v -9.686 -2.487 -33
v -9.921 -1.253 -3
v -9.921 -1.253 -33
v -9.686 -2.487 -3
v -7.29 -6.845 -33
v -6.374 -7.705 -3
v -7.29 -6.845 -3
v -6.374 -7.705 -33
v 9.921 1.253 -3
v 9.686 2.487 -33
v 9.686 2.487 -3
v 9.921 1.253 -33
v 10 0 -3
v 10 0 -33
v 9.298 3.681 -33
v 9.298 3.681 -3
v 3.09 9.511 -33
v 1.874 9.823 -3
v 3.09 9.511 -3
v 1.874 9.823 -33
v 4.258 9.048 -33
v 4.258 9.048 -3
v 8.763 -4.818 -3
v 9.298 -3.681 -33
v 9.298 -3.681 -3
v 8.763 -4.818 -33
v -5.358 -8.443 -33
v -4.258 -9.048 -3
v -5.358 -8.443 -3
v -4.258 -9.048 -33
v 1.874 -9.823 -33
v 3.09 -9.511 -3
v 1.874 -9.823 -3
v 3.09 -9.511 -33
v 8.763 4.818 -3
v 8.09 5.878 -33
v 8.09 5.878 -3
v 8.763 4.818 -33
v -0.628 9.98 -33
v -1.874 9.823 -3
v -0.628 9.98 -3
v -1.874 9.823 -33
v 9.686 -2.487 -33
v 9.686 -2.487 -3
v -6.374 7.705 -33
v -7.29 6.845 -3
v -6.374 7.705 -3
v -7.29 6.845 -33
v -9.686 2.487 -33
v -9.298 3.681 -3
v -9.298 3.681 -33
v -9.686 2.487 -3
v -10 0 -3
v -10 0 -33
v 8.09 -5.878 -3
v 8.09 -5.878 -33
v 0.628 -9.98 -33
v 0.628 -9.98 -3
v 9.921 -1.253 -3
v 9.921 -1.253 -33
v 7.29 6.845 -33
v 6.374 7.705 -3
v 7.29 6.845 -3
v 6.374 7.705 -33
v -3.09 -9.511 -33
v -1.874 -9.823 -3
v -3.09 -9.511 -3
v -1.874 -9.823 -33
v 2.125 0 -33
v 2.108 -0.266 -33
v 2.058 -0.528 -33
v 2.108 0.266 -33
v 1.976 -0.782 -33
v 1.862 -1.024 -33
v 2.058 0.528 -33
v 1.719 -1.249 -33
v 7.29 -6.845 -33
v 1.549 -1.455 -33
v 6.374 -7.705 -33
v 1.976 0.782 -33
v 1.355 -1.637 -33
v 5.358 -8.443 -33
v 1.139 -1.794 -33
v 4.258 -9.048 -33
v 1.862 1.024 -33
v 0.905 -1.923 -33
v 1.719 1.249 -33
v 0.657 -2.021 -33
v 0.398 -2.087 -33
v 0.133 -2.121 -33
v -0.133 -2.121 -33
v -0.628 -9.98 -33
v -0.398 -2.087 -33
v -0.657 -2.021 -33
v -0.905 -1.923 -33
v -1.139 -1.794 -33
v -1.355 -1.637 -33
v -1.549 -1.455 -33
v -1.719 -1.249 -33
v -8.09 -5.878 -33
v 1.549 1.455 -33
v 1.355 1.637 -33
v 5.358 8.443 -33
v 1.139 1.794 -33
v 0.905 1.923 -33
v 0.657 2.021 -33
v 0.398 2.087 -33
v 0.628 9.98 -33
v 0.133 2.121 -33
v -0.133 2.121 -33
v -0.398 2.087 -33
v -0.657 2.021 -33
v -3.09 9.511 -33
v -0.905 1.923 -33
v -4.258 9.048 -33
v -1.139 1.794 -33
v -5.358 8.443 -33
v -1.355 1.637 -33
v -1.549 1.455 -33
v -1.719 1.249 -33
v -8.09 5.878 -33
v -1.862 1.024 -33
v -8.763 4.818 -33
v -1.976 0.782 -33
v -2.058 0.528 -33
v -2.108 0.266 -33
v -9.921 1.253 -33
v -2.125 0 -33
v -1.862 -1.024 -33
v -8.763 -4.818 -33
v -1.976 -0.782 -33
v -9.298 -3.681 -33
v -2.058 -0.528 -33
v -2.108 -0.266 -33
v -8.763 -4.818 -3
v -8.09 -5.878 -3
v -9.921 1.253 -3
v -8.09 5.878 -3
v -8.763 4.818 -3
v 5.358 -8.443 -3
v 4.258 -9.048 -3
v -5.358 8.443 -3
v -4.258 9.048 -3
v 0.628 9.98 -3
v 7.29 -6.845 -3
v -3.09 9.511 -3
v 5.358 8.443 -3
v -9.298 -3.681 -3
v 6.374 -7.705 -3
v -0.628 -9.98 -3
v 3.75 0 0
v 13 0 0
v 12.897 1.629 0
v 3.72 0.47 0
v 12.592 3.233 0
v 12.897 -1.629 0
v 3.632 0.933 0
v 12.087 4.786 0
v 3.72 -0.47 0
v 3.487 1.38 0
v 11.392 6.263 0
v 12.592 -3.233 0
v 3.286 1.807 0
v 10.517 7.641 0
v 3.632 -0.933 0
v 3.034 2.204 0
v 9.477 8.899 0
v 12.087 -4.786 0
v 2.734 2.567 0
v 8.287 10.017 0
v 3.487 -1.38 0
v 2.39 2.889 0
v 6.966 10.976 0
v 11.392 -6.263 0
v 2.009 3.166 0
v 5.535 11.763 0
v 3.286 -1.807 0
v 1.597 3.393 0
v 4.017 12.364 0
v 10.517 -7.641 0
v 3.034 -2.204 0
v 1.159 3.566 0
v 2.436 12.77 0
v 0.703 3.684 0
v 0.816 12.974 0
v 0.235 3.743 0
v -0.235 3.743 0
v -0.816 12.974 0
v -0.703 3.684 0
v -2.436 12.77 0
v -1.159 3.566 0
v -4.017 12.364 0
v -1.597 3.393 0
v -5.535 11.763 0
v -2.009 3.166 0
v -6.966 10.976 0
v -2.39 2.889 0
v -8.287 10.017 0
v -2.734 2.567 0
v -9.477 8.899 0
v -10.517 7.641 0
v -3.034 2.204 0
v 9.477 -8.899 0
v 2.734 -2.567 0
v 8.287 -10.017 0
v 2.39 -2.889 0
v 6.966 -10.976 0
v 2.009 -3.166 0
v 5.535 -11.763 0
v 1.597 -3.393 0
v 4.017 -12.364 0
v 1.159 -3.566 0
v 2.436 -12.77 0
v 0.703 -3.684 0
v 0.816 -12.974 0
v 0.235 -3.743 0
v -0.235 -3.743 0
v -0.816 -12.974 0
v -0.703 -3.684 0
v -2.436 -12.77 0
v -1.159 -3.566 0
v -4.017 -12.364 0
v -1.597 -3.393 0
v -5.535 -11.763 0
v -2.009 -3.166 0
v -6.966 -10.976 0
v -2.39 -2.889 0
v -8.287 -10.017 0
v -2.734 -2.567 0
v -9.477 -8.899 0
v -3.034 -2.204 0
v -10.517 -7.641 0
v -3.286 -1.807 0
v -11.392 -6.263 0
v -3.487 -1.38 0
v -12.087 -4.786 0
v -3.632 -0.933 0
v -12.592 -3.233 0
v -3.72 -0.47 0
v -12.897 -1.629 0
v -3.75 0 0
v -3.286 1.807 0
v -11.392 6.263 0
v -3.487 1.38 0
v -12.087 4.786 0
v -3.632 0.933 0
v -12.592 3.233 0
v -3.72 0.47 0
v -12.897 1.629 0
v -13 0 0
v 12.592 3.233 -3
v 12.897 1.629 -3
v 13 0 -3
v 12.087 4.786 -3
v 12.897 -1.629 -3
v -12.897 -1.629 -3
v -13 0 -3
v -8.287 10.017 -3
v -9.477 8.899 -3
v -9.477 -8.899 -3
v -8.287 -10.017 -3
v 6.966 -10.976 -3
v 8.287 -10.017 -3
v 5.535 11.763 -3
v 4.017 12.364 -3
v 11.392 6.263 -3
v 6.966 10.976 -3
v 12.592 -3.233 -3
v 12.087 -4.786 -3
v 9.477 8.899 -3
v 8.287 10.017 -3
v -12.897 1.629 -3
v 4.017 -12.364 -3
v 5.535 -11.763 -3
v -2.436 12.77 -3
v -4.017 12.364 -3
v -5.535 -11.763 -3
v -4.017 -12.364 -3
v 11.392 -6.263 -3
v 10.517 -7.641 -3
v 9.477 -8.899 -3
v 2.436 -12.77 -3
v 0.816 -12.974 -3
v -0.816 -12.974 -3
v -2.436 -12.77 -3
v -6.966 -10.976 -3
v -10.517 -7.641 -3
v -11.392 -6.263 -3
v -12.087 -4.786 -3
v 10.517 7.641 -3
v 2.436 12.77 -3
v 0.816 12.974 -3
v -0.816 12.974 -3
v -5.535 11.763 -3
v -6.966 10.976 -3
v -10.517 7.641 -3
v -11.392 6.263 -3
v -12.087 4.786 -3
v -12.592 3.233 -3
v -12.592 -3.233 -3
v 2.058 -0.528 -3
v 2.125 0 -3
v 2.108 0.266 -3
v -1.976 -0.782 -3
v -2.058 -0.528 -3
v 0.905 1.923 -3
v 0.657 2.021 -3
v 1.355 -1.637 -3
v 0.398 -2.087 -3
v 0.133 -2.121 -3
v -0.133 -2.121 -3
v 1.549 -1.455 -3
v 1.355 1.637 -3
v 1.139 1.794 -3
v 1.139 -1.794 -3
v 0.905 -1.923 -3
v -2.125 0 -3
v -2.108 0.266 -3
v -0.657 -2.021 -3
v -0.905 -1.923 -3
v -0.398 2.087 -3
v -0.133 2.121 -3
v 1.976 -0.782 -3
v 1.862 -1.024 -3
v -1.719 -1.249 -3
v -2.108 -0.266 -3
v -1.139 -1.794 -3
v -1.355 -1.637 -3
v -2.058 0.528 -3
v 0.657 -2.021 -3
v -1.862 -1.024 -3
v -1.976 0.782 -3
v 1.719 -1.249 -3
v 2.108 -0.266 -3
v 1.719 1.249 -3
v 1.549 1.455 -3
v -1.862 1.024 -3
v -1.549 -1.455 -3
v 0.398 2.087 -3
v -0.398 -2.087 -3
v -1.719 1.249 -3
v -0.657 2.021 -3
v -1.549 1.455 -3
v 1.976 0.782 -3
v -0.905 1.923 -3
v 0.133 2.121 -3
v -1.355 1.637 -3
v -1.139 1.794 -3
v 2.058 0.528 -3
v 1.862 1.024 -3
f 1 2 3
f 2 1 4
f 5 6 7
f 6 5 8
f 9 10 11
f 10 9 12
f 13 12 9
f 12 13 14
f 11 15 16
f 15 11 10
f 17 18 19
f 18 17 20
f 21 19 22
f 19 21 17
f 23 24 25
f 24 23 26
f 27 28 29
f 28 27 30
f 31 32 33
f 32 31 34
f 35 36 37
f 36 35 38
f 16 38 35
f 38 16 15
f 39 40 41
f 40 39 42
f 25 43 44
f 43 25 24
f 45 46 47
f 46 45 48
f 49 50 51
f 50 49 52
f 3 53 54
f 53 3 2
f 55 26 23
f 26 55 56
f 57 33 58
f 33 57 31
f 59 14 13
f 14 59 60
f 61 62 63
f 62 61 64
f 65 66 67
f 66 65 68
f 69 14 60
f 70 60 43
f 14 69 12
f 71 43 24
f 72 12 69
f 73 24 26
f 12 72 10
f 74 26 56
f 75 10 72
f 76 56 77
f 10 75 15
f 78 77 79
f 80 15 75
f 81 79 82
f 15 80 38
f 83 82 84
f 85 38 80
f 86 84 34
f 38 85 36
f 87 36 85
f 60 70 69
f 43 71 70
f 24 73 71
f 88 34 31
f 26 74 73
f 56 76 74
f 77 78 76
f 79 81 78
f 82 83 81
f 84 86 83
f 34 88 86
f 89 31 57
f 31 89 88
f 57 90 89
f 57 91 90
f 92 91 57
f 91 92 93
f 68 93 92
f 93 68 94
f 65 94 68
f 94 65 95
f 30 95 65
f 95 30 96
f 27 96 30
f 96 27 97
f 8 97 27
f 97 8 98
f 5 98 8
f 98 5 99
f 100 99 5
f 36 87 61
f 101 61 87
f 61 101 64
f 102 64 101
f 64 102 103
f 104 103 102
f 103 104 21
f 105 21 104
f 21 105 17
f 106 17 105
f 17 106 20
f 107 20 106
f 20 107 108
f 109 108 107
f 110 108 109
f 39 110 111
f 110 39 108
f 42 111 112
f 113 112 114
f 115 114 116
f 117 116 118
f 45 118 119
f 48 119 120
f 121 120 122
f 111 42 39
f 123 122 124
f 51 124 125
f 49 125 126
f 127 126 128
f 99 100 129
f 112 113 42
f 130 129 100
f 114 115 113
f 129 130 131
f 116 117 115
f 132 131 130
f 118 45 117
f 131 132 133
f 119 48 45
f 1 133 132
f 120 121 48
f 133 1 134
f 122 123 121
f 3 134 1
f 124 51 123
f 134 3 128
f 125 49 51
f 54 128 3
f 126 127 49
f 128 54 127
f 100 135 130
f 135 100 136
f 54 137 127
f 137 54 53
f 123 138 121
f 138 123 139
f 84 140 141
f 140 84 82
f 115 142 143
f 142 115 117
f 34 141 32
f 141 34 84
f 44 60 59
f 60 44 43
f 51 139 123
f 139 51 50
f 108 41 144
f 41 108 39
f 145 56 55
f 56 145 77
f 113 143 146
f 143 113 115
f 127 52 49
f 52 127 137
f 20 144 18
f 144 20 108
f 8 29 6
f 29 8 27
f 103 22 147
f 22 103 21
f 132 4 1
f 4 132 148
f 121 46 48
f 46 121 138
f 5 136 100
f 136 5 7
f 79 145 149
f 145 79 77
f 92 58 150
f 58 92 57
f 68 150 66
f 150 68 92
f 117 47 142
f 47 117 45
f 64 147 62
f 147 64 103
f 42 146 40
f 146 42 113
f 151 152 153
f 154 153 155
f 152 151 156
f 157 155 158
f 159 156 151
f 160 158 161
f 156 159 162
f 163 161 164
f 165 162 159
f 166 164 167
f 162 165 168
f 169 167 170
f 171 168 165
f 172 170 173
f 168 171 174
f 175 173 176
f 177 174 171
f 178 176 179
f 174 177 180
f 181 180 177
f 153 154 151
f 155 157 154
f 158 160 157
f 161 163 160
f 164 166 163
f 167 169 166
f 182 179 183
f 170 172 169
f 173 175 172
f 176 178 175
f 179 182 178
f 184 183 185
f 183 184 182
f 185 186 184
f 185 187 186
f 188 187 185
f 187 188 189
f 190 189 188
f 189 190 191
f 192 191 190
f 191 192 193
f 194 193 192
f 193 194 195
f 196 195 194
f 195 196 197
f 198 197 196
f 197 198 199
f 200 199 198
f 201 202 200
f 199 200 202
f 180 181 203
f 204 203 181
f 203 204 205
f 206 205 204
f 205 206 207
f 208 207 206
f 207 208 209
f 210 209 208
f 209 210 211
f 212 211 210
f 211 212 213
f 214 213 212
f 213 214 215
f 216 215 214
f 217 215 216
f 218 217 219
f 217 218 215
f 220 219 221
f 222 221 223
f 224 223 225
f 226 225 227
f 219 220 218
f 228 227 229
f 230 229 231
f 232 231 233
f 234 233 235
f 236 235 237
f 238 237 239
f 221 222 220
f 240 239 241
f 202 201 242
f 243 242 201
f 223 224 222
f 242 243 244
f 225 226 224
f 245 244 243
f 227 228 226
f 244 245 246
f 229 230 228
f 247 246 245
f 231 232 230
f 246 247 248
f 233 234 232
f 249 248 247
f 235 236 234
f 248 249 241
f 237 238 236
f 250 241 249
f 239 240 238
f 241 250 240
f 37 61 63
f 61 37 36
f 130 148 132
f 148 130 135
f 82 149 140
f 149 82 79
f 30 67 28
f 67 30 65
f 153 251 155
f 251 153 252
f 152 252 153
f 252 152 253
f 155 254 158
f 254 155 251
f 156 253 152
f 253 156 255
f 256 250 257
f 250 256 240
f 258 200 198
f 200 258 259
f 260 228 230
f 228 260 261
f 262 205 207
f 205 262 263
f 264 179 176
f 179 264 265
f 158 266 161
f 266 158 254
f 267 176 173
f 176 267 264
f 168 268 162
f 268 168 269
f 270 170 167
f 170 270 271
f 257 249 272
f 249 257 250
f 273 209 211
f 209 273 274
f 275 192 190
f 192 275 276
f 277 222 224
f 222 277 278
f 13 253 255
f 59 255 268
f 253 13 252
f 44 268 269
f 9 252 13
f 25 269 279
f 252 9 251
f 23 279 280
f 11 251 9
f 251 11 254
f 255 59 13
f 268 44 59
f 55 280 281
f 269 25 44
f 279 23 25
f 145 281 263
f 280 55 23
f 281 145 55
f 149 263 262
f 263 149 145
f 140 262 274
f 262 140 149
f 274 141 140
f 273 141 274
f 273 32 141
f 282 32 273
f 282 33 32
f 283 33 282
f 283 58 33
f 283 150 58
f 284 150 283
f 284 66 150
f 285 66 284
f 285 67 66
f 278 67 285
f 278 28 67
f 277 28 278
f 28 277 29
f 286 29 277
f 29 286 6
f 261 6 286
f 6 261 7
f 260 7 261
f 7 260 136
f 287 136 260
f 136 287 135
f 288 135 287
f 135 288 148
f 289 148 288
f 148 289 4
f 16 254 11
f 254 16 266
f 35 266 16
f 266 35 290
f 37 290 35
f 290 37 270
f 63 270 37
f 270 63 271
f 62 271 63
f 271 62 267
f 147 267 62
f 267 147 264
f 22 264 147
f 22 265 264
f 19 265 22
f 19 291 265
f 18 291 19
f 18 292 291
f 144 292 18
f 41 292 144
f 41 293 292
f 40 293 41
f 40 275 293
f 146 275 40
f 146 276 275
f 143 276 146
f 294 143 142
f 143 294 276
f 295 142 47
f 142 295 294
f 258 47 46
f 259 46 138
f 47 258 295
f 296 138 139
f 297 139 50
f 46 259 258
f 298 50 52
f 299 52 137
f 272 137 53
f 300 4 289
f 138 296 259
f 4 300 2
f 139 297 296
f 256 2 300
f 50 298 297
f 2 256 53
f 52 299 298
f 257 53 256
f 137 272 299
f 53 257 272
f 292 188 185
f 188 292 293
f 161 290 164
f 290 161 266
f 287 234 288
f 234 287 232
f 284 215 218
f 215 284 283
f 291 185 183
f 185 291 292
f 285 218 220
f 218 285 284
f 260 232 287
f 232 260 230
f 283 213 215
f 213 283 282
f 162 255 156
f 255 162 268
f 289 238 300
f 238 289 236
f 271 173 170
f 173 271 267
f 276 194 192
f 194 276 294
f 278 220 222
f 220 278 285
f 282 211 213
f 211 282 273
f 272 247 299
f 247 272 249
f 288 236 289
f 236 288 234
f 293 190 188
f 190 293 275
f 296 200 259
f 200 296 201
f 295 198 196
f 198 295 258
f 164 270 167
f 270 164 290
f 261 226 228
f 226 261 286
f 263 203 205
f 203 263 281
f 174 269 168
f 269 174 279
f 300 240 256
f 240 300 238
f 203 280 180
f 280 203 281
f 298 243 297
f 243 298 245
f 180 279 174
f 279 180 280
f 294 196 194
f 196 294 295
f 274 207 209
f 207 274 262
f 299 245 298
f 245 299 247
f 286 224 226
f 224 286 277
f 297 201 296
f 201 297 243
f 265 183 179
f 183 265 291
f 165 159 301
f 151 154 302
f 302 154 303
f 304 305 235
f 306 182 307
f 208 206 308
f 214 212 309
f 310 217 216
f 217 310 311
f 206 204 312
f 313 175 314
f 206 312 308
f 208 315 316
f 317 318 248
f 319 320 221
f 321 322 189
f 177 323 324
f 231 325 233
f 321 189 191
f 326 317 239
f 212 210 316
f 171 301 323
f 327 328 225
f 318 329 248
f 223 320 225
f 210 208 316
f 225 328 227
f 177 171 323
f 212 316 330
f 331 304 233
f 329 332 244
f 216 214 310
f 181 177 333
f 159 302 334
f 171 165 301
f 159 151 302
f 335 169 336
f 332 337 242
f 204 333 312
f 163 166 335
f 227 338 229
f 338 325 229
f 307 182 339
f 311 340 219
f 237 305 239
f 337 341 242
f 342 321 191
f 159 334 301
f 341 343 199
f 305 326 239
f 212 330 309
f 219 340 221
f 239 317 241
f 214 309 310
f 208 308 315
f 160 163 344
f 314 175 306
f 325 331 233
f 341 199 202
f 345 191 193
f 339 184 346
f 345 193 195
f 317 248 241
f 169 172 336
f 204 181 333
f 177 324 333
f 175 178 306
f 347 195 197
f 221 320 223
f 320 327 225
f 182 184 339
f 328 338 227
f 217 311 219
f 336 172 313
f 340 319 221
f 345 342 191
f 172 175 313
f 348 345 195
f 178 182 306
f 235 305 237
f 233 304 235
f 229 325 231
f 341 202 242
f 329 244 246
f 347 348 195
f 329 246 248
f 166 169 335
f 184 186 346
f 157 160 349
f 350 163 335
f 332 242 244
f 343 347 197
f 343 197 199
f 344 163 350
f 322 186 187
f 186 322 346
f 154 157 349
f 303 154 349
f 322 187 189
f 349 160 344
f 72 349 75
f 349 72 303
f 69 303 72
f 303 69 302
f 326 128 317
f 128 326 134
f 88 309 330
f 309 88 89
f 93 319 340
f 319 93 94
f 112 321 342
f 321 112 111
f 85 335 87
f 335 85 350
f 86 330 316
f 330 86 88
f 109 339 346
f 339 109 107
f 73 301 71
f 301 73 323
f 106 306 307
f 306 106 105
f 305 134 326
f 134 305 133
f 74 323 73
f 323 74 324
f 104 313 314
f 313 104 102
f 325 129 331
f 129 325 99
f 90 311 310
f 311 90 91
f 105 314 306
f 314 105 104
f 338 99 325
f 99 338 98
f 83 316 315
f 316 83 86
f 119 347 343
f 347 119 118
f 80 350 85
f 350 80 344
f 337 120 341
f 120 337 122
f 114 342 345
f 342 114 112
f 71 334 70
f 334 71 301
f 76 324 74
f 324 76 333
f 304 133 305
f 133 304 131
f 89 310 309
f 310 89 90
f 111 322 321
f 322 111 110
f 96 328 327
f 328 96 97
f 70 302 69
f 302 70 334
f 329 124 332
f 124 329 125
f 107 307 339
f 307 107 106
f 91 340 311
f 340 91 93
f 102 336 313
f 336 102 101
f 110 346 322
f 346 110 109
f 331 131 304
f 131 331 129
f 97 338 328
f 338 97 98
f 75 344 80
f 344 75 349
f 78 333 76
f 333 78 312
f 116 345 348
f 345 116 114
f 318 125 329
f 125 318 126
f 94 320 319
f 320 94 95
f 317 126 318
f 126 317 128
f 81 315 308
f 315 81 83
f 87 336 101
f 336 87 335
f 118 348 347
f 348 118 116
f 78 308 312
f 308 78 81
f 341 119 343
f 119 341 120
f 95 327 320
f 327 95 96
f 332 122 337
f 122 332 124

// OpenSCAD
$fn = 50;


difference() {
	union() {
		translate(v = [0, 0, -33.0000000000]) {
			cylinder(h = 33, r = 10.0000000000);
		}
		translate(v = [0, 0, -3.0000000000]) {
			cylinder(h = 3, r = 13.0000000000);
		}
	}
	union() {
		translate(v = [0, 0, 0]) {
			rotate(a = [0, 0, 0]) {
				difference() {
					union() {
						#translate(v = [0, 0, -33.0000000000]) {
							cylinder(h = 33, r = 2.0000000000);
						}
						#translate(v = [0, 0, -3]) {
							cylinder(h = 3, r1 = 2.1250000000, r2 = 3.7500000000);
						}
						#translate(v = [0, 0, -33.0000000000]) {
							cylinder(h = 33, r = 2.1250000000);
						}
						#translate(v = [0, 0, -33.0000000000]) {
							cylinder(h = 33, r = 2.0000000000);
						}
					}
					union();
				}
			}
		}
	}
}
